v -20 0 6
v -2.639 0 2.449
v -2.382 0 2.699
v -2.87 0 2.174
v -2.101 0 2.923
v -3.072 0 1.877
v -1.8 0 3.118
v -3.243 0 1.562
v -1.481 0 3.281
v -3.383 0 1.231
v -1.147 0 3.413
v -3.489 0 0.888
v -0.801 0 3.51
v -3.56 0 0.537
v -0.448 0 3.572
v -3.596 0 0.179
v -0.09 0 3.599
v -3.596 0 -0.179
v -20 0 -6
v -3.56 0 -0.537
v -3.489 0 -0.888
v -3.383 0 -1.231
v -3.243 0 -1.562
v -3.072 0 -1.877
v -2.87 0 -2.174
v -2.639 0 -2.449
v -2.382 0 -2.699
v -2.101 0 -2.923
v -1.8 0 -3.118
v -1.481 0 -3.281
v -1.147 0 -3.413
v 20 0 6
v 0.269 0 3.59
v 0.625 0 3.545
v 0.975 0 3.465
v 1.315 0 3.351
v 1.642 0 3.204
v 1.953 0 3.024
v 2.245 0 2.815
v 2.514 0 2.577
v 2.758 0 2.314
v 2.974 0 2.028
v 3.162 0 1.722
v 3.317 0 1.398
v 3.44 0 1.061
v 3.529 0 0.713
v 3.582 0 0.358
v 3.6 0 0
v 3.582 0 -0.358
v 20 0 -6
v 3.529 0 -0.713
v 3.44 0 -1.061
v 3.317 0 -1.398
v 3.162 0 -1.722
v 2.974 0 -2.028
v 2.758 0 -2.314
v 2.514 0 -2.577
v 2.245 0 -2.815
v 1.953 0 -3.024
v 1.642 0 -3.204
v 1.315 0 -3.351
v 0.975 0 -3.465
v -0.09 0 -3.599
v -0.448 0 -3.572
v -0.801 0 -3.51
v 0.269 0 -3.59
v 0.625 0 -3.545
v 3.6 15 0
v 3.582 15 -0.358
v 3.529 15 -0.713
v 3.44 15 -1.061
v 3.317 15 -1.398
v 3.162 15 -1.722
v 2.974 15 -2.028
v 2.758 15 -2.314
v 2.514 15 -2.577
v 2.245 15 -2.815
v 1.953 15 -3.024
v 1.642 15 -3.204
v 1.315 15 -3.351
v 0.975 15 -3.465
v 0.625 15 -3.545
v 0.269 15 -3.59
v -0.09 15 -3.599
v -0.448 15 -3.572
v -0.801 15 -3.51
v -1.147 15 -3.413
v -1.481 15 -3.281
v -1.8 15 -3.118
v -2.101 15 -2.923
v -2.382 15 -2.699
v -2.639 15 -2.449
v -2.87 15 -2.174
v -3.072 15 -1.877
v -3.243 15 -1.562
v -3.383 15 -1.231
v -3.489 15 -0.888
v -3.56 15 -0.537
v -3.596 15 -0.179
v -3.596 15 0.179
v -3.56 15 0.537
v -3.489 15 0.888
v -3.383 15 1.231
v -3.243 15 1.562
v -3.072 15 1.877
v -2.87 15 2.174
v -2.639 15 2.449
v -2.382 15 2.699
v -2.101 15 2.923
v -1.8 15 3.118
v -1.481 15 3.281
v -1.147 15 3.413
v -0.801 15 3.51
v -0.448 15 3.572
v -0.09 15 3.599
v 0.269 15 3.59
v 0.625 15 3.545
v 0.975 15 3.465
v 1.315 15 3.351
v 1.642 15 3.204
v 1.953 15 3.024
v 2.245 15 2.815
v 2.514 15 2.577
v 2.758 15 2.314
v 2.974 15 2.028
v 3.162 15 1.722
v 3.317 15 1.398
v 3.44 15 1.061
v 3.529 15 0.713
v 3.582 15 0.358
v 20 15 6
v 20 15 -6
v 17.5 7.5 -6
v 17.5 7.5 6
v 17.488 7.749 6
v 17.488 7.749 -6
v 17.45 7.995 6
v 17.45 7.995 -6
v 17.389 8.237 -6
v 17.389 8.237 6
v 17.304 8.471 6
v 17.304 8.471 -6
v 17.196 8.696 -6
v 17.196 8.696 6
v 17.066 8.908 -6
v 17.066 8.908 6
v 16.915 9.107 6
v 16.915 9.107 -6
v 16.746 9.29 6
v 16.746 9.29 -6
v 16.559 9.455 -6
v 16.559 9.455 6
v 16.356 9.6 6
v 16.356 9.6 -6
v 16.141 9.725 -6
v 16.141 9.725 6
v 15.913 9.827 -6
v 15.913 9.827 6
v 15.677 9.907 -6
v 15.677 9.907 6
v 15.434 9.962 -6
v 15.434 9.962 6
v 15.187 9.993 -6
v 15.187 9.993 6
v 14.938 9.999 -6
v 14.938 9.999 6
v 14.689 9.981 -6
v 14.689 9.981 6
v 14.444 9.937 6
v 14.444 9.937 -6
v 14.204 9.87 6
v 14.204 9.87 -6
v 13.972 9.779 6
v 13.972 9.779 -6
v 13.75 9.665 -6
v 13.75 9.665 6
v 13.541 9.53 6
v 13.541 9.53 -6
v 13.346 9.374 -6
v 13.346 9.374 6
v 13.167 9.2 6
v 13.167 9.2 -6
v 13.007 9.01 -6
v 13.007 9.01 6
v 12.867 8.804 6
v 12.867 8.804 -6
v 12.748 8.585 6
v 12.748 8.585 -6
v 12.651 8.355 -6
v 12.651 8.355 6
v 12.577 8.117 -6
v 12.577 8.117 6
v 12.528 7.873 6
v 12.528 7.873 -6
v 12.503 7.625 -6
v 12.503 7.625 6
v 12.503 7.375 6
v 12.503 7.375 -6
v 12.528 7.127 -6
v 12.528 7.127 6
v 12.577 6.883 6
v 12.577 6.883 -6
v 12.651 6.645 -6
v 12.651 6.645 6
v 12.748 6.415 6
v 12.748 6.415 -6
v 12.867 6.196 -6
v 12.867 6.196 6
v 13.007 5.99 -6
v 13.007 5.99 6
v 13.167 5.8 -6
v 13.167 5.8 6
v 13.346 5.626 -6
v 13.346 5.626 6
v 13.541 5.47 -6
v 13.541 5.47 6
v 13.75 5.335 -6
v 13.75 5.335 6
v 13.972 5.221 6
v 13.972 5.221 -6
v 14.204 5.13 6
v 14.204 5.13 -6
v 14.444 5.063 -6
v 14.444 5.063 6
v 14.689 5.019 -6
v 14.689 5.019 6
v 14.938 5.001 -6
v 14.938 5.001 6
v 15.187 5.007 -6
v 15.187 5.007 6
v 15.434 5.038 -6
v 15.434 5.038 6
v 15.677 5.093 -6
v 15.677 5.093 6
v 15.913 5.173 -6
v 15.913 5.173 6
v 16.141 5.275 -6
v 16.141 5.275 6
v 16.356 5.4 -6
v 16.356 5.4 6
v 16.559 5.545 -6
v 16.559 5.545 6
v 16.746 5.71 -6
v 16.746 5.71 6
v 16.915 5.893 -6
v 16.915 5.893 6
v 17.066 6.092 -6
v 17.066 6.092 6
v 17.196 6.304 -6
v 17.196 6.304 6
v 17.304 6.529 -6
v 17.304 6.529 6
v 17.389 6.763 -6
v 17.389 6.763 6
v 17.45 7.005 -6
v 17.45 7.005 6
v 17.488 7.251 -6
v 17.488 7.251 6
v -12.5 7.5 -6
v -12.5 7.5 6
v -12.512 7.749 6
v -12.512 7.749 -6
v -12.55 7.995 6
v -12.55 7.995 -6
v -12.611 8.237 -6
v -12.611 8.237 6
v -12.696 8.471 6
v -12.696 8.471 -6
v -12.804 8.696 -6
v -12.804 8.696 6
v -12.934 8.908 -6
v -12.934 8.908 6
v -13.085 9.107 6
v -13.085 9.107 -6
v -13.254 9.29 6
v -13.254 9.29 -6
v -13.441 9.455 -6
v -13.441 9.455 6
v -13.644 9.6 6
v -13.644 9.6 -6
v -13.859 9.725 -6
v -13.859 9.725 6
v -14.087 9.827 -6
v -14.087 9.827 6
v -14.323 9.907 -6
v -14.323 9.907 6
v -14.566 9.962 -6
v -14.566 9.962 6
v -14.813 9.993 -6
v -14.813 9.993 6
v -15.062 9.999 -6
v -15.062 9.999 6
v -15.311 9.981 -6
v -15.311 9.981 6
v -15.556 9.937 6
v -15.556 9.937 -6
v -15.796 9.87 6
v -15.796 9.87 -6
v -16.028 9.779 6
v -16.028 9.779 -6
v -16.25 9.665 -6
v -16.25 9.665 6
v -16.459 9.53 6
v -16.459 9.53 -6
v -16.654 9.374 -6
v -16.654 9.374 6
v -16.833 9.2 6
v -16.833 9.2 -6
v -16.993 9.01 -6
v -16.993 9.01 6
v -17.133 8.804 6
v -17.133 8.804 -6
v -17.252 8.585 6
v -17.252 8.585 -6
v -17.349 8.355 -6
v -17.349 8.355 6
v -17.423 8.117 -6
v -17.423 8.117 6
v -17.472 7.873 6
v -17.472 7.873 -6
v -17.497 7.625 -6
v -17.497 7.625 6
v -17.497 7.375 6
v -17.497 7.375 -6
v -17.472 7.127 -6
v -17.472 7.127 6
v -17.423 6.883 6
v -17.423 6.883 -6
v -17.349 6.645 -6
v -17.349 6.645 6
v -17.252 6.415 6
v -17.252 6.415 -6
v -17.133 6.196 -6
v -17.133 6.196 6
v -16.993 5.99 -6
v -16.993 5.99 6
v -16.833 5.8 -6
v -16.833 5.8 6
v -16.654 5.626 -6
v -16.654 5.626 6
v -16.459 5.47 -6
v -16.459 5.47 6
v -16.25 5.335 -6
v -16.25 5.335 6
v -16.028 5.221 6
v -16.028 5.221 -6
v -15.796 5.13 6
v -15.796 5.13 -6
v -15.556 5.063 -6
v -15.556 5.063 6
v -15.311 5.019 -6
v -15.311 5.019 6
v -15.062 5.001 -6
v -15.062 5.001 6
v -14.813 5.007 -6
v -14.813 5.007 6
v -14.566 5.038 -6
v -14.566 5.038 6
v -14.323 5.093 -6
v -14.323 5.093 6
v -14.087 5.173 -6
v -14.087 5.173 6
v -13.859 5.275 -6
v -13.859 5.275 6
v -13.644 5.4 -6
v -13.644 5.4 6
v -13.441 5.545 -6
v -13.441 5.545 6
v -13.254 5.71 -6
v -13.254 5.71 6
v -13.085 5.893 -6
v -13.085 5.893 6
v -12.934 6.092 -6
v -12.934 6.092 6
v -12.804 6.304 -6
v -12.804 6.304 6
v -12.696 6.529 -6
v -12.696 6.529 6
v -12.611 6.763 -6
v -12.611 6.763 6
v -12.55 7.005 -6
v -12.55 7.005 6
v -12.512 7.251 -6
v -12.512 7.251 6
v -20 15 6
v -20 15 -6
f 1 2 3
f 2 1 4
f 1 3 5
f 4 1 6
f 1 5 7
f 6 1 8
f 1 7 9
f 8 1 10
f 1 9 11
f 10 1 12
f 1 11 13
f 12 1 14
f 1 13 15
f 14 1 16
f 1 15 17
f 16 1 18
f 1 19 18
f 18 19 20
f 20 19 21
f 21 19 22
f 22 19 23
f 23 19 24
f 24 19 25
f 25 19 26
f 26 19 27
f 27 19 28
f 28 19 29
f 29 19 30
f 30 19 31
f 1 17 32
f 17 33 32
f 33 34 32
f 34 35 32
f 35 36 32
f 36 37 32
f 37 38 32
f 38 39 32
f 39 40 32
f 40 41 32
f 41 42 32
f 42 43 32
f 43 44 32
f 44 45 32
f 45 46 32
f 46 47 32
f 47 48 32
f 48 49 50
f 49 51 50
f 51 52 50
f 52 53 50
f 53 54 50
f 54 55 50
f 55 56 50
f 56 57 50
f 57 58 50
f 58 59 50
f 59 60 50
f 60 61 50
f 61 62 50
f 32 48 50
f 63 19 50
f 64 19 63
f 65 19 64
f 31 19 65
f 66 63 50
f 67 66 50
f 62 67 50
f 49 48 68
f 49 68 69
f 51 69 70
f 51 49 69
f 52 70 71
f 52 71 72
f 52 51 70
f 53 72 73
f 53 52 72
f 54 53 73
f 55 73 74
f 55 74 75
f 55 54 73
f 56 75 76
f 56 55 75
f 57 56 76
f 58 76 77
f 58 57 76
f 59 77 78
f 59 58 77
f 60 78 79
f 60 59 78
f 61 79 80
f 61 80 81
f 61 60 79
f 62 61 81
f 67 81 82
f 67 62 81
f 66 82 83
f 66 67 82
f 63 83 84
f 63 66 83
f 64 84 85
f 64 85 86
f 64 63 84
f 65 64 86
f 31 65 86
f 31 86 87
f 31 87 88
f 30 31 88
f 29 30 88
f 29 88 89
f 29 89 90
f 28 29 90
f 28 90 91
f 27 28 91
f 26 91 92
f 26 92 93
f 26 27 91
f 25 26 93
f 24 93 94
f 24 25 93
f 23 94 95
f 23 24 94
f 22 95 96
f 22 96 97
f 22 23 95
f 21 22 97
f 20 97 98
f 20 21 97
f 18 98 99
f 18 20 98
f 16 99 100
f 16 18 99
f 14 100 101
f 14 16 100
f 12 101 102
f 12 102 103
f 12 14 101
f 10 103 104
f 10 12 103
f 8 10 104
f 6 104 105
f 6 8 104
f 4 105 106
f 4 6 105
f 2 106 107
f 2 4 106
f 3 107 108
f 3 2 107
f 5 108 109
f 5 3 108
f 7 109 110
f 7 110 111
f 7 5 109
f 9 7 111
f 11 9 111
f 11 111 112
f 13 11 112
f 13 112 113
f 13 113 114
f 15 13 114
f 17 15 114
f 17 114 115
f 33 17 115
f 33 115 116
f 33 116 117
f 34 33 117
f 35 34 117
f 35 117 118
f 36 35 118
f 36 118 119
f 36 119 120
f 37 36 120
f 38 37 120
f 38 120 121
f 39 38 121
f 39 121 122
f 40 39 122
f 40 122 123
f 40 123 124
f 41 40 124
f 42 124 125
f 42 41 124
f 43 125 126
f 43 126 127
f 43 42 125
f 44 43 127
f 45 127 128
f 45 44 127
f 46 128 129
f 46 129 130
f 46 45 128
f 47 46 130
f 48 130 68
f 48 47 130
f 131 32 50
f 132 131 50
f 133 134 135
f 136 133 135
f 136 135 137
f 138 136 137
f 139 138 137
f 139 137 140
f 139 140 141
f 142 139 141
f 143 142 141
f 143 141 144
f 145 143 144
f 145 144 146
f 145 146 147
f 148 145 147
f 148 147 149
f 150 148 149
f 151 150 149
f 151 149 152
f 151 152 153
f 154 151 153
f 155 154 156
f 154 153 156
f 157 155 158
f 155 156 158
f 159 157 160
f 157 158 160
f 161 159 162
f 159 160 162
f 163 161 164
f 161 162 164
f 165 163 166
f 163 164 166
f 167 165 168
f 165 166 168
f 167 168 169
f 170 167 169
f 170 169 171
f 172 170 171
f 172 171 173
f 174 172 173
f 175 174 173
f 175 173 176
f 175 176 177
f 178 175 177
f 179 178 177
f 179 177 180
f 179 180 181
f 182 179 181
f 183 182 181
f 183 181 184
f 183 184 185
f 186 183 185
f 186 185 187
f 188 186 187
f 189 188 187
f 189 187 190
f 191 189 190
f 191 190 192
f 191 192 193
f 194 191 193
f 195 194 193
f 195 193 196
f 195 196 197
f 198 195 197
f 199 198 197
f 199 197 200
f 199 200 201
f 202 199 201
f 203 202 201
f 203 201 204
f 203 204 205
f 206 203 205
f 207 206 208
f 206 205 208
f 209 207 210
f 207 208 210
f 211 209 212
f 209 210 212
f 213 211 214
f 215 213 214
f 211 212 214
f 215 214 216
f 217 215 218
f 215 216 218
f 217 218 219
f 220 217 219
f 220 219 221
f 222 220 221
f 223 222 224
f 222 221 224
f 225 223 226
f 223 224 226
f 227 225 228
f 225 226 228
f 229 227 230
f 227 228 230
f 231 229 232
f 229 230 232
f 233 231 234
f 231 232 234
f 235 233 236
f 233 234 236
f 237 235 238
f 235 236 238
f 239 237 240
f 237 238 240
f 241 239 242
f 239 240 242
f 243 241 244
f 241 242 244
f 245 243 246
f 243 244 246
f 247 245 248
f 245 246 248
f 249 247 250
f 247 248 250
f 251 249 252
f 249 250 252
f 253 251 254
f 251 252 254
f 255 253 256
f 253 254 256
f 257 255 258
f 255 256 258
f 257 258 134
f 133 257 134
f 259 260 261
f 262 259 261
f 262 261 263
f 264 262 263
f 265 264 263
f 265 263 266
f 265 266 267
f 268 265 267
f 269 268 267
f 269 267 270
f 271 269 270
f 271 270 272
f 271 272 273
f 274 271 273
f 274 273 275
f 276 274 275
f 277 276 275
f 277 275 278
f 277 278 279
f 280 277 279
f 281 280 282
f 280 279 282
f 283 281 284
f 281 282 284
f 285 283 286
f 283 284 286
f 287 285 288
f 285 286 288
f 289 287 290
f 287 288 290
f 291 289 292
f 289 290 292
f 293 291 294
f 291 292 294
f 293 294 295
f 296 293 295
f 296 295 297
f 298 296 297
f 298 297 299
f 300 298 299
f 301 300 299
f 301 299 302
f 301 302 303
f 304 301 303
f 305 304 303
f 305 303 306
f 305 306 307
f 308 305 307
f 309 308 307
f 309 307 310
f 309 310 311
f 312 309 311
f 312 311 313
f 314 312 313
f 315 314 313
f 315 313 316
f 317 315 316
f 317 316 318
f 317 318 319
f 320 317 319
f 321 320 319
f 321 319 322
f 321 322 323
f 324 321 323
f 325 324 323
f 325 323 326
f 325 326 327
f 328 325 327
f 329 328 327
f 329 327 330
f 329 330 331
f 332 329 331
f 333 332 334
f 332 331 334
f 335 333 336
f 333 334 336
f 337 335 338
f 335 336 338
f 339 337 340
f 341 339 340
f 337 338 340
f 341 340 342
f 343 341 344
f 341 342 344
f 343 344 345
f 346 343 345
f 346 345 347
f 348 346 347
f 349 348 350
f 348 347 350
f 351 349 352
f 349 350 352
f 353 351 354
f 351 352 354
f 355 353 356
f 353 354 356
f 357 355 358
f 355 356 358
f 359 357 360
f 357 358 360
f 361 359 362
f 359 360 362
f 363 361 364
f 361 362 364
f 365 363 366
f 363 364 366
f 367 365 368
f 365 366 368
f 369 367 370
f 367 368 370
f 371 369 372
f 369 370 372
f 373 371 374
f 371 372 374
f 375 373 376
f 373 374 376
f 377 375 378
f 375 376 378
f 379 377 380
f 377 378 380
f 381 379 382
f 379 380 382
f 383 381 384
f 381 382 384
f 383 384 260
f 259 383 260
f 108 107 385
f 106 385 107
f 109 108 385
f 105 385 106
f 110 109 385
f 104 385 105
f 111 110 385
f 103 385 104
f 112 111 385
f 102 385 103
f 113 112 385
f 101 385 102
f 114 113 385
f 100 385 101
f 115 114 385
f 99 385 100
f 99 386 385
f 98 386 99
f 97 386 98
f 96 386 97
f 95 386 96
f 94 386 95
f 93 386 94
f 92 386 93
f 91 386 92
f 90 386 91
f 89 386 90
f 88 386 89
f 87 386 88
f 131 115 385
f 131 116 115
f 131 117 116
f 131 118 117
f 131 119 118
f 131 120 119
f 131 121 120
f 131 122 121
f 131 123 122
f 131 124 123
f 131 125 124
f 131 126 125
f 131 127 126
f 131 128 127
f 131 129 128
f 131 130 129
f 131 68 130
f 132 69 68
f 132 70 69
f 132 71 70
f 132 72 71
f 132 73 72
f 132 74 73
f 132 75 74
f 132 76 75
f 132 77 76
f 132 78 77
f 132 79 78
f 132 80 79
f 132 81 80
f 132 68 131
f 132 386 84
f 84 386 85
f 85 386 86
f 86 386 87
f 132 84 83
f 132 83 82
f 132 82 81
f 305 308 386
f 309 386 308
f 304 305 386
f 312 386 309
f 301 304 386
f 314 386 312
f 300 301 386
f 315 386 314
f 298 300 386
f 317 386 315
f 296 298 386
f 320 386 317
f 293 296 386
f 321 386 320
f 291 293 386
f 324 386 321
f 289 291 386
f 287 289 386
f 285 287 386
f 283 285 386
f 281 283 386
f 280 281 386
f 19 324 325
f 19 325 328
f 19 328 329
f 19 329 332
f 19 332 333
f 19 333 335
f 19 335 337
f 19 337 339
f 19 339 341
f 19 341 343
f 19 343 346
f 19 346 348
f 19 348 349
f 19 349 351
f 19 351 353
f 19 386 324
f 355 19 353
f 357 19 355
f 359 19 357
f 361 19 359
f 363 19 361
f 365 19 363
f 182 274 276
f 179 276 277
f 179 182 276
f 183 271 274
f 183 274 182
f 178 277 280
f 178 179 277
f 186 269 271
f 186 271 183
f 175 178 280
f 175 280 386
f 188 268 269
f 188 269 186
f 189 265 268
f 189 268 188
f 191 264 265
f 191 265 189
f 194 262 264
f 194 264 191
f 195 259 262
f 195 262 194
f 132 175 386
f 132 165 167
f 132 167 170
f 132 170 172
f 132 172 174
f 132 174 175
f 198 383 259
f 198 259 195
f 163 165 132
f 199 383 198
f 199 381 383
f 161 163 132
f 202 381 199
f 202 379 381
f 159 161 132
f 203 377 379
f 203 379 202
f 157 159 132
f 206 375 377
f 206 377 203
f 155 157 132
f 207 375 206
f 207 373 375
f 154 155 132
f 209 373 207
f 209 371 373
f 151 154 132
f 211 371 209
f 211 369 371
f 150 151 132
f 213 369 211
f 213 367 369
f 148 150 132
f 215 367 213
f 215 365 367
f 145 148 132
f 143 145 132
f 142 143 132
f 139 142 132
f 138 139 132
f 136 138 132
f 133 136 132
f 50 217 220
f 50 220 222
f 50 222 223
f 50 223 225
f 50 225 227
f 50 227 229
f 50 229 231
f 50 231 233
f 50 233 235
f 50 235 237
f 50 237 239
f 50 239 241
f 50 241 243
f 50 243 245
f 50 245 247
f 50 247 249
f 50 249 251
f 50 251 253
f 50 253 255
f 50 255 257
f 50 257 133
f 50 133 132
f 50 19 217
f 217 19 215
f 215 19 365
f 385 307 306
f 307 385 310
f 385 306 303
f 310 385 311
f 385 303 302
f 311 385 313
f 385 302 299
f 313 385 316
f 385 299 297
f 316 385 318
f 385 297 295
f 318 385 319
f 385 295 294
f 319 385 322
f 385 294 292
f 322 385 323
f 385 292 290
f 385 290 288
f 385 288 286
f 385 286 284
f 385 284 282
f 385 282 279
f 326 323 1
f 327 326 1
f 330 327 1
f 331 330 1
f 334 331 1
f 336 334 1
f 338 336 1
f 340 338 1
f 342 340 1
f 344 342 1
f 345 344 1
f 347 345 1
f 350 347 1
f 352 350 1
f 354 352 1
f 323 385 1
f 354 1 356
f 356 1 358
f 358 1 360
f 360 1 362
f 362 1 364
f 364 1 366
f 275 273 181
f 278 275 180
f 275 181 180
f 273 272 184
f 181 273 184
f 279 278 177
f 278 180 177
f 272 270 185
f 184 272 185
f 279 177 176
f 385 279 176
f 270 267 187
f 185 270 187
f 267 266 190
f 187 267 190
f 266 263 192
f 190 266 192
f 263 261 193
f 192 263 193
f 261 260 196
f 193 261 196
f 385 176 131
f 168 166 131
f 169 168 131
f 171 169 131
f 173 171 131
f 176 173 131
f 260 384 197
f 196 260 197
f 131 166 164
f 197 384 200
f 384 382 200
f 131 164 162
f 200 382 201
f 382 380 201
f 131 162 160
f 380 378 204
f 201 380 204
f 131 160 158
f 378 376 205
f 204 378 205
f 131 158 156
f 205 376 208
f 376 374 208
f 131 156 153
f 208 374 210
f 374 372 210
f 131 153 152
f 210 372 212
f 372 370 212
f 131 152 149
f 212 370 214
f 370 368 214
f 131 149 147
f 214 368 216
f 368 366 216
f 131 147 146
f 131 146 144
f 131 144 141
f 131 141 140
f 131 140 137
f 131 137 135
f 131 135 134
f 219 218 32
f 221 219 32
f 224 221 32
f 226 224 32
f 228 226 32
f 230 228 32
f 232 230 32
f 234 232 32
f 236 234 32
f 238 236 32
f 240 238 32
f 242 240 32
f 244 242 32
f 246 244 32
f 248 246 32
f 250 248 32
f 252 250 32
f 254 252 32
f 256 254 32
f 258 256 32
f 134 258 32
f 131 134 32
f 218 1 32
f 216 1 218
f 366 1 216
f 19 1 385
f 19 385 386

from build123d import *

# Parameters (mm, degrees)
SKETCH_1_W          = 40
SKETCH_1_H          = 12
SKETCH_1_R          = 3.6
EXTRUDE_1_DEPTH     = 15
SKETCH_2_R          = 2.5
CUT_EXTRUDE_1_DEPTH = 13


with BuildPart() as part:
    # Эскиз1 → Бобышка-Вытянуть1 (new body)
    with BuildSketch(Plane(origin=(0, 0, 0), x_dir=(1, 0, 0), z_dir=(0, 1, 0))):
        Rectangle(SKETCH_1_W, SKETCH_1_H)
        Circle(SKETCH_1_R, mode=Mode.SUBTRACT)
    extrude(amount=EXTRUDE_1_DEPTH)

    # Эскиз2 → Вырез-Вытянуть1 (cut, through all)
    with BuildSketch(Plane.XY.offset(6)):
        with Locations((-15, 7.5)):
            Circle(SKETCH_2_R)
        with Locations((15, 7.5)):
            Circle(SKETCH_2_R)
    extrude(amount=-CUT_EXTRUDE_1_DEPTH, mode=Mode.SUBTRACT)


solid = part.part
